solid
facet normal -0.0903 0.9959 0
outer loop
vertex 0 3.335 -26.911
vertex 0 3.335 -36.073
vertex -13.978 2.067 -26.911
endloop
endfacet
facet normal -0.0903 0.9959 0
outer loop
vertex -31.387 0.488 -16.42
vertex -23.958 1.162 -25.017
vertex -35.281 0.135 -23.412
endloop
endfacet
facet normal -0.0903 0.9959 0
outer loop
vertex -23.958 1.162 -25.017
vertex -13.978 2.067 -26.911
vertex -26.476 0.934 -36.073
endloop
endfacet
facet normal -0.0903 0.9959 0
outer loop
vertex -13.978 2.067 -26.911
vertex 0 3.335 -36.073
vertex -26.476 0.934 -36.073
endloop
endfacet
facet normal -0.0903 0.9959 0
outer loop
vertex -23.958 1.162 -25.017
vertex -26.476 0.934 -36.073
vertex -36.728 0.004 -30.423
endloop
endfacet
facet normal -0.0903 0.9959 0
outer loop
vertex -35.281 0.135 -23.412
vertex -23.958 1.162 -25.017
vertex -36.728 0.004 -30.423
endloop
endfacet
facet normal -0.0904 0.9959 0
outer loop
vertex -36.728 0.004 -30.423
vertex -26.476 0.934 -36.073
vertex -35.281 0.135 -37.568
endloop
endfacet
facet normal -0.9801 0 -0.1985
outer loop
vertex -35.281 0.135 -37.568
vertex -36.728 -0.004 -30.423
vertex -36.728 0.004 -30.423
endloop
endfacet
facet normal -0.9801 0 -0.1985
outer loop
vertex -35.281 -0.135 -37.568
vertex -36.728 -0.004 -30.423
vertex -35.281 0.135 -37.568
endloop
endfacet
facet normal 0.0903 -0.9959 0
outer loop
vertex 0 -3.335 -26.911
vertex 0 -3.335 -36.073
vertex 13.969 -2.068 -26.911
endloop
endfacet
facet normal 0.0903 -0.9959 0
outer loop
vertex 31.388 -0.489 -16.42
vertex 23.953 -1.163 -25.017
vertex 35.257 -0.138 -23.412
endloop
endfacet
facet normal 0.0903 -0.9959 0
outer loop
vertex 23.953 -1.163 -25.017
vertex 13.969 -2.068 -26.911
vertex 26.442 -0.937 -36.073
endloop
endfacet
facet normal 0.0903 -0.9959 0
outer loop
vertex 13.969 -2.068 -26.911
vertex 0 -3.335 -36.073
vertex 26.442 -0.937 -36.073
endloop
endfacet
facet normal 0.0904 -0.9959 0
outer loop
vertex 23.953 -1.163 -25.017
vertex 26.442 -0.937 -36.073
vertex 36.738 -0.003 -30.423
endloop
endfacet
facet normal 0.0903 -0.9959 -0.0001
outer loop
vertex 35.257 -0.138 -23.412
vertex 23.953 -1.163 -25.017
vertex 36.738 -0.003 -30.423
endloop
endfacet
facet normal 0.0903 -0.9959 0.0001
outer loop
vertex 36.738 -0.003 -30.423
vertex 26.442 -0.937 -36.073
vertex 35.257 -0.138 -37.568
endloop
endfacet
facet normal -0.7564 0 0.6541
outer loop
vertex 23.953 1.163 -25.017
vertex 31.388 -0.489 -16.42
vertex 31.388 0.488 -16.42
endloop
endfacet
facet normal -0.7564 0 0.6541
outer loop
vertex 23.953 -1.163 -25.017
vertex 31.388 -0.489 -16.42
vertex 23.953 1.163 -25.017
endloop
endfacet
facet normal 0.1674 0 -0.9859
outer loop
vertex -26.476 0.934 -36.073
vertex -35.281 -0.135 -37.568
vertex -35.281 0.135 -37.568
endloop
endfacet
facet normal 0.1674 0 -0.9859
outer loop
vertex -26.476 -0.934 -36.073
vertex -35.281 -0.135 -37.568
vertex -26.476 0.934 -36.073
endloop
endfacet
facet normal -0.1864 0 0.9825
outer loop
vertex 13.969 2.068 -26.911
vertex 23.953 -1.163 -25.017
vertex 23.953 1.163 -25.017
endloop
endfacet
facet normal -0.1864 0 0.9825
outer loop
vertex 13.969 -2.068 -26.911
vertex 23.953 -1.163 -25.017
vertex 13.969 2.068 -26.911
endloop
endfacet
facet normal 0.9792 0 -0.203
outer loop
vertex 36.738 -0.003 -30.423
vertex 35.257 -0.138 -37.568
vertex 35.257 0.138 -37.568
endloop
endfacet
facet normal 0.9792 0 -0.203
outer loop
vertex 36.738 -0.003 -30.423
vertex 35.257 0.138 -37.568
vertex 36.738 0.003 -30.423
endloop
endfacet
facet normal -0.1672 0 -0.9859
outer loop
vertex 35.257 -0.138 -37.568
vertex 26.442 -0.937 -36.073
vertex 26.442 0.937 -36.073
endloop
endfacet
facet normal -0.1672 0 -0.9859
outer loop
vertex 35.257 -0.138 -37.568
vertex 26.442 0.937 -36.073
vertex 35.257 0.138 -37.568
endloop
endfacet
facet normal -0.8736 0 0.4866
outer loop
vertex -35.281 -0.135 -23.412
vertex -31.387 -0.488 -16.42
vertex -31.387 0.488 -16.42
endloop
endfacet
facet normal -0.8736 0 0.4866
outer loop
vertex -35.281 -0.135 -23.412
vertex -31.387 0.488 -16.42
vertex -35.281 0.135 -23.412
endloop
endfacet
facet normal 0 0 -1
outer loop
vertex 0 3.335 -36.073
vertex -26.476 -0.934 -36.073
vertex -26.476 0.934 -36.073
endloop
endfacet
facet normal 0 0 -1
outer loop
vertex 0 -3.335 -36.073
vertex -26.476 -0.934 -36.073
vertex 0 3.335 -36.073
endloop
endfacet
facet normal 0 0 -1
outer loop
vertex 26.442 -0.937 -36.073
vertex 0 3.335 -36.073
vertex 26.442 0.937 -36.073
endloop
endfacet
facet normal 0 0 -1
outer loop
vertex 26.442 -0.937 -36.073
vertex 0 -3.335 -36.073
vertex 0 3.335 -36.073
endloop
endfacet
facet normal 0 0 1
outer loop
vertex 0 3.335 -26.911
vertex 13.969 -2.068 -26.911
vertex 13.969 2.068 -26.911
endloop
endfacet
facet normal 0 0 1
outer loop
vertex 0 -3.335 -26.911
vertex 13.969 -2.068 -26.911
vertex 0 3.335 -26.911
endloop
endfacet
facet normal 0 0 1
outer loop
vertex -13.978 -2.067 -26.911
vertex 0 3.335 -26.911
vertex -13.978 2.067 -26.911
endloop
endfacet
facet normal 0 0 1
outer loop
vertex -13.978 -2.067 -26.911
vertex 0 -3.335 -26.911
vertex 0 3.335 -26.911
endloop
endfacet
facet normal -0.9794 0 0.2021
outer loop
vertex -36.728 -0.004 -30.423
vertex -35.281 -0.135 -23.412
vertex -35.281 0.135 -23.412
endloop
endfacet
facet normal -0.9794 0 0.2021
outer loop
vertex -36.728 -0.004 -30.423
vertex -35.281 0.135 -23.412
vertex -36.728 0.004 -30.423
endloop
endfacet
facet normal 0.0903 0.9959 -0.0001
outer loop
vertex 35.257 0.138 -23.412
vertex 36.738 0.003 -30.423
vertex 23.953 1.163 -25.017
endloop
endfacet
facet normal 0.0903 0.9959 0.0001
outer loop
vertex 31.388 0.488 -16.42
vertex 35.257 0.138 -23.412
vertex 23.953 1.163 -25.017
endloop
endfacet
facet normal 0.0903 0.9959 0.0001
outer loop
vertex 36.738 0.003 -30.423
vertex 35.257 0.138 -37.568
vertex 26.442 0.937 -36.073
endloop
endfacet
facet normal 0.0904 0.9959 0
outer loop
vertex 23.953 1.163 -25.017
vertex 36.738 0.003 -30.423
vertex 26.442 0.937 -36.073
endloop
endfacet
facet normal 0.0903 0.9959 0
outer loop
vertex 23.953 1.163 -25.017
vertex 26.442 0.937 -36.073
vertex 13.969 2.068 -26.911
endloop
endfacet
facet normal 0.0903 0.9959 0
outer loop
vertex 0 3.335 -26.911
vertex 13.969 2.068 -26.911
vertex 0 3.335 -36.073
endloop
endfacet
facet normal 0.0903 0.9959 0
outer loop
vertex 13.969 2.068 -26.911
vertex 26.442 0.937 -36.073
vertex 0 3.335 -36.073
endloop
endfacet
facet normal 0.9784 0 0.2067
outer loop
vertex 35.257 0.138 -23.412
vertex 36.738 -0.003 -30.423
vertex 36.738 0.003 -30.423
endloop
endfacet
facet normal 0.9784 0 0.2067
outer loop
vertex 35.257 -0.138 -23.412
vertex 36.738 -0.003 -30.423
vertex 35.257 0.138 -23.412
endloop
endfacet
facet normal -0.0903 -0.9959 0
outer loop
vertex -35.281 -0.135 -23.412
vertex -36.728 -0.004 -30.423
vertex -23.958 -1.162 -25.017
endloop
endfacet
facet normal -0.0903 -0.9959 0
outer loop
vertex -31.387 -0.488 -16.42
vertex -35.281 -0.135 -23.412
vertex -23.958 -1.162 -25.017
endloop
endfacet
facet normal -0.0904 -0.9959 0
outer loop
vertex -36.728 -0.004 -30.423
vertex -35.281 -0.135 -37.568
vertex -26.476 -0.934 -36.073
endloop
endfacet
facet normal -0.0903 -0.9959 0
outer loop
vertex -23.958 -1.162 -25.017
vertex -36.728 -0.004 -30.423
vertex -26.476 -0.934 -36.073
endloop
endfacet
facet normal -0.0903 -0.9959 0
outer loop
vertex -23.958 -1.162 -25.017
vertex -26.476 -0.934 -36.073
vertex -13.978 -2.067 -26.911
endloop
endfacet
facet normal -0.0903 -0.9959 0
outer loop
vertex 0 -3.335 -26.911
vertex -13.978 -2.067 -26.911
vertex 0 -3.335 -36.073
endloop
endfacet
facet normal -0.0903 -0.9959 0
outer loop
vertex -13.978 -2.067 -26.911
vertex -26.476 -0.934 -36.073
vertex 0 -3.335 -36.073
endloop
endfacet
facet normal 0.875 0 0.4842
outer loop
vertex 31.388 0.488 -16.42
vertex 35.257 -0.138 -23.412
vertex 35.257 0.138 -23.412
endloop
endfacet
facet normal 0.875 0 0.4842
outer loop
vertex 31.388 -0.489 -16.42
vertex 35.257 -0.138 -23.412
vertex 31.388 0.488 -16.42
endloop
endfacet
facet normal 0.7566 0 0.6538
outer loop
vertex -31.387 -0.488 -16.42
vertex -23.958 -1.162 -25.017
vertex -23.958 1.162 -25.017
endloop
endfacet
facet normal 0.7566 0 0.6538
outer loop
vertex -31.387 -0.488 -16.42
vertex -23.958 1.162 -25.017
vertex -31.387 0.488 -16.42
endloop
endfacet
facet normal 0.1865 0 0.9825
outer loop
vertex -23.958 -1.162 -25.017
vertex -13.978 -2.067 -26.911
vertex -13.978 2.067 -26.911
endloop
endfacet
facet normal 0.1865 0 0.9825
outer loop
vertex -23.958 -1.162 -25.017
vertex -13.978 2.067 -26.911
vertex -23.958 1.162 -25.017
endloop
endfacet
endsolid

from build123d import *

# Parameters (mm, degrees)
F1_DEPTH = 6.35
F2_DEPTH = 6.35
F3_W     = 41.3920721039
F3_H     = 19.1692784429
F4_DEPTH = 25.4
F5_DEPTH = 76.2
F6_W     = 87.5323042274
F6_H     = 20.6641275436
F7_DEPTH = 1270
F8_DEPTH = 127


with BuildPart() as f1:
    # F0 (on Front) → F1 (new body)
    with BuildSketch(Plane.XZ):
        Polygon((13.9693478122, -26.9105285406), (0, -26.9105285406), (-13.9777120203, -26.9105285406), (-23.9575356245, -25.0166002661), (-31.3873849809, -16.4197664708), (-35.2805815637, -23.4119985253), (-36.7282442749, -30.4229743779), (-35.2805815637, -37.568423897), (-26.4761578292, -36.0731184483), (26.4421477914, -36.0731184483), (35.2569408715, -37.568423897), (36.7377512157, -30.4229743779), (35.2569408715, -23.4119985253), (31.3880257308, -16.4197664708), (23.9525288343, -25.0166002661), align=None)
    extrude(amount=F1_DEPTH)

    # F2 (add): a face of the model
    f2_faces = [f1.faces().sort_by_distance(p)[0] for p in [
        (-0.0050105125, 0, -30.0017701646),
    ]]
    extrude(f2_faces, amount=F2_DEPTH)

    # F6 (on face) → F7 (cut)
    with BuildSketch(Plane(origin=(0, 0, -76.2), x_dir=(1, 0, 0), z_dir=(0, 0, -1))):
        with Locations((-0.8414760232, -1.1486634612)):
            Rectangle(F6_W, F6_H)
        Polygon((0, 3.335296642), (36.7744714022, 0), (0, -3.3350162109), (-36.7713794112, 0), align=None, mode=Mode.SUBTRACT)
    extrude(amount=-F7_DEPTH, mode=Mode.SUBTRACT)


with BuildPart() as f4:
    # F3 (on Top) → F4 (new body)
    with BuildSketch(Plane.XY):
        with Locations((5.1154219545, -48.7104393542)):
            Rectangle(F3_W, F3_H)
    extrude(amount=F4_DEPTH)

    # F5 (add): a face of the model
    f5_faces = [f4.faces().sort_by_distance(p)[0] for p in [
        (5.1154219545, -48.7104393542, 0),
    ]]
    extrude(f5_faces, amount=F5_DEPTH)

    # F8 (cut): a face of the model
    f8_faces = [f4.faces().sort_by_distance(p)[0] for p in [
        (5.1154219545, -48.7104393542, -76.2),
    ]]
    extrude(f8_faces, amount=-F8_DEPTH, mode=Mode.SUBTRACT)


solid = f1.part
